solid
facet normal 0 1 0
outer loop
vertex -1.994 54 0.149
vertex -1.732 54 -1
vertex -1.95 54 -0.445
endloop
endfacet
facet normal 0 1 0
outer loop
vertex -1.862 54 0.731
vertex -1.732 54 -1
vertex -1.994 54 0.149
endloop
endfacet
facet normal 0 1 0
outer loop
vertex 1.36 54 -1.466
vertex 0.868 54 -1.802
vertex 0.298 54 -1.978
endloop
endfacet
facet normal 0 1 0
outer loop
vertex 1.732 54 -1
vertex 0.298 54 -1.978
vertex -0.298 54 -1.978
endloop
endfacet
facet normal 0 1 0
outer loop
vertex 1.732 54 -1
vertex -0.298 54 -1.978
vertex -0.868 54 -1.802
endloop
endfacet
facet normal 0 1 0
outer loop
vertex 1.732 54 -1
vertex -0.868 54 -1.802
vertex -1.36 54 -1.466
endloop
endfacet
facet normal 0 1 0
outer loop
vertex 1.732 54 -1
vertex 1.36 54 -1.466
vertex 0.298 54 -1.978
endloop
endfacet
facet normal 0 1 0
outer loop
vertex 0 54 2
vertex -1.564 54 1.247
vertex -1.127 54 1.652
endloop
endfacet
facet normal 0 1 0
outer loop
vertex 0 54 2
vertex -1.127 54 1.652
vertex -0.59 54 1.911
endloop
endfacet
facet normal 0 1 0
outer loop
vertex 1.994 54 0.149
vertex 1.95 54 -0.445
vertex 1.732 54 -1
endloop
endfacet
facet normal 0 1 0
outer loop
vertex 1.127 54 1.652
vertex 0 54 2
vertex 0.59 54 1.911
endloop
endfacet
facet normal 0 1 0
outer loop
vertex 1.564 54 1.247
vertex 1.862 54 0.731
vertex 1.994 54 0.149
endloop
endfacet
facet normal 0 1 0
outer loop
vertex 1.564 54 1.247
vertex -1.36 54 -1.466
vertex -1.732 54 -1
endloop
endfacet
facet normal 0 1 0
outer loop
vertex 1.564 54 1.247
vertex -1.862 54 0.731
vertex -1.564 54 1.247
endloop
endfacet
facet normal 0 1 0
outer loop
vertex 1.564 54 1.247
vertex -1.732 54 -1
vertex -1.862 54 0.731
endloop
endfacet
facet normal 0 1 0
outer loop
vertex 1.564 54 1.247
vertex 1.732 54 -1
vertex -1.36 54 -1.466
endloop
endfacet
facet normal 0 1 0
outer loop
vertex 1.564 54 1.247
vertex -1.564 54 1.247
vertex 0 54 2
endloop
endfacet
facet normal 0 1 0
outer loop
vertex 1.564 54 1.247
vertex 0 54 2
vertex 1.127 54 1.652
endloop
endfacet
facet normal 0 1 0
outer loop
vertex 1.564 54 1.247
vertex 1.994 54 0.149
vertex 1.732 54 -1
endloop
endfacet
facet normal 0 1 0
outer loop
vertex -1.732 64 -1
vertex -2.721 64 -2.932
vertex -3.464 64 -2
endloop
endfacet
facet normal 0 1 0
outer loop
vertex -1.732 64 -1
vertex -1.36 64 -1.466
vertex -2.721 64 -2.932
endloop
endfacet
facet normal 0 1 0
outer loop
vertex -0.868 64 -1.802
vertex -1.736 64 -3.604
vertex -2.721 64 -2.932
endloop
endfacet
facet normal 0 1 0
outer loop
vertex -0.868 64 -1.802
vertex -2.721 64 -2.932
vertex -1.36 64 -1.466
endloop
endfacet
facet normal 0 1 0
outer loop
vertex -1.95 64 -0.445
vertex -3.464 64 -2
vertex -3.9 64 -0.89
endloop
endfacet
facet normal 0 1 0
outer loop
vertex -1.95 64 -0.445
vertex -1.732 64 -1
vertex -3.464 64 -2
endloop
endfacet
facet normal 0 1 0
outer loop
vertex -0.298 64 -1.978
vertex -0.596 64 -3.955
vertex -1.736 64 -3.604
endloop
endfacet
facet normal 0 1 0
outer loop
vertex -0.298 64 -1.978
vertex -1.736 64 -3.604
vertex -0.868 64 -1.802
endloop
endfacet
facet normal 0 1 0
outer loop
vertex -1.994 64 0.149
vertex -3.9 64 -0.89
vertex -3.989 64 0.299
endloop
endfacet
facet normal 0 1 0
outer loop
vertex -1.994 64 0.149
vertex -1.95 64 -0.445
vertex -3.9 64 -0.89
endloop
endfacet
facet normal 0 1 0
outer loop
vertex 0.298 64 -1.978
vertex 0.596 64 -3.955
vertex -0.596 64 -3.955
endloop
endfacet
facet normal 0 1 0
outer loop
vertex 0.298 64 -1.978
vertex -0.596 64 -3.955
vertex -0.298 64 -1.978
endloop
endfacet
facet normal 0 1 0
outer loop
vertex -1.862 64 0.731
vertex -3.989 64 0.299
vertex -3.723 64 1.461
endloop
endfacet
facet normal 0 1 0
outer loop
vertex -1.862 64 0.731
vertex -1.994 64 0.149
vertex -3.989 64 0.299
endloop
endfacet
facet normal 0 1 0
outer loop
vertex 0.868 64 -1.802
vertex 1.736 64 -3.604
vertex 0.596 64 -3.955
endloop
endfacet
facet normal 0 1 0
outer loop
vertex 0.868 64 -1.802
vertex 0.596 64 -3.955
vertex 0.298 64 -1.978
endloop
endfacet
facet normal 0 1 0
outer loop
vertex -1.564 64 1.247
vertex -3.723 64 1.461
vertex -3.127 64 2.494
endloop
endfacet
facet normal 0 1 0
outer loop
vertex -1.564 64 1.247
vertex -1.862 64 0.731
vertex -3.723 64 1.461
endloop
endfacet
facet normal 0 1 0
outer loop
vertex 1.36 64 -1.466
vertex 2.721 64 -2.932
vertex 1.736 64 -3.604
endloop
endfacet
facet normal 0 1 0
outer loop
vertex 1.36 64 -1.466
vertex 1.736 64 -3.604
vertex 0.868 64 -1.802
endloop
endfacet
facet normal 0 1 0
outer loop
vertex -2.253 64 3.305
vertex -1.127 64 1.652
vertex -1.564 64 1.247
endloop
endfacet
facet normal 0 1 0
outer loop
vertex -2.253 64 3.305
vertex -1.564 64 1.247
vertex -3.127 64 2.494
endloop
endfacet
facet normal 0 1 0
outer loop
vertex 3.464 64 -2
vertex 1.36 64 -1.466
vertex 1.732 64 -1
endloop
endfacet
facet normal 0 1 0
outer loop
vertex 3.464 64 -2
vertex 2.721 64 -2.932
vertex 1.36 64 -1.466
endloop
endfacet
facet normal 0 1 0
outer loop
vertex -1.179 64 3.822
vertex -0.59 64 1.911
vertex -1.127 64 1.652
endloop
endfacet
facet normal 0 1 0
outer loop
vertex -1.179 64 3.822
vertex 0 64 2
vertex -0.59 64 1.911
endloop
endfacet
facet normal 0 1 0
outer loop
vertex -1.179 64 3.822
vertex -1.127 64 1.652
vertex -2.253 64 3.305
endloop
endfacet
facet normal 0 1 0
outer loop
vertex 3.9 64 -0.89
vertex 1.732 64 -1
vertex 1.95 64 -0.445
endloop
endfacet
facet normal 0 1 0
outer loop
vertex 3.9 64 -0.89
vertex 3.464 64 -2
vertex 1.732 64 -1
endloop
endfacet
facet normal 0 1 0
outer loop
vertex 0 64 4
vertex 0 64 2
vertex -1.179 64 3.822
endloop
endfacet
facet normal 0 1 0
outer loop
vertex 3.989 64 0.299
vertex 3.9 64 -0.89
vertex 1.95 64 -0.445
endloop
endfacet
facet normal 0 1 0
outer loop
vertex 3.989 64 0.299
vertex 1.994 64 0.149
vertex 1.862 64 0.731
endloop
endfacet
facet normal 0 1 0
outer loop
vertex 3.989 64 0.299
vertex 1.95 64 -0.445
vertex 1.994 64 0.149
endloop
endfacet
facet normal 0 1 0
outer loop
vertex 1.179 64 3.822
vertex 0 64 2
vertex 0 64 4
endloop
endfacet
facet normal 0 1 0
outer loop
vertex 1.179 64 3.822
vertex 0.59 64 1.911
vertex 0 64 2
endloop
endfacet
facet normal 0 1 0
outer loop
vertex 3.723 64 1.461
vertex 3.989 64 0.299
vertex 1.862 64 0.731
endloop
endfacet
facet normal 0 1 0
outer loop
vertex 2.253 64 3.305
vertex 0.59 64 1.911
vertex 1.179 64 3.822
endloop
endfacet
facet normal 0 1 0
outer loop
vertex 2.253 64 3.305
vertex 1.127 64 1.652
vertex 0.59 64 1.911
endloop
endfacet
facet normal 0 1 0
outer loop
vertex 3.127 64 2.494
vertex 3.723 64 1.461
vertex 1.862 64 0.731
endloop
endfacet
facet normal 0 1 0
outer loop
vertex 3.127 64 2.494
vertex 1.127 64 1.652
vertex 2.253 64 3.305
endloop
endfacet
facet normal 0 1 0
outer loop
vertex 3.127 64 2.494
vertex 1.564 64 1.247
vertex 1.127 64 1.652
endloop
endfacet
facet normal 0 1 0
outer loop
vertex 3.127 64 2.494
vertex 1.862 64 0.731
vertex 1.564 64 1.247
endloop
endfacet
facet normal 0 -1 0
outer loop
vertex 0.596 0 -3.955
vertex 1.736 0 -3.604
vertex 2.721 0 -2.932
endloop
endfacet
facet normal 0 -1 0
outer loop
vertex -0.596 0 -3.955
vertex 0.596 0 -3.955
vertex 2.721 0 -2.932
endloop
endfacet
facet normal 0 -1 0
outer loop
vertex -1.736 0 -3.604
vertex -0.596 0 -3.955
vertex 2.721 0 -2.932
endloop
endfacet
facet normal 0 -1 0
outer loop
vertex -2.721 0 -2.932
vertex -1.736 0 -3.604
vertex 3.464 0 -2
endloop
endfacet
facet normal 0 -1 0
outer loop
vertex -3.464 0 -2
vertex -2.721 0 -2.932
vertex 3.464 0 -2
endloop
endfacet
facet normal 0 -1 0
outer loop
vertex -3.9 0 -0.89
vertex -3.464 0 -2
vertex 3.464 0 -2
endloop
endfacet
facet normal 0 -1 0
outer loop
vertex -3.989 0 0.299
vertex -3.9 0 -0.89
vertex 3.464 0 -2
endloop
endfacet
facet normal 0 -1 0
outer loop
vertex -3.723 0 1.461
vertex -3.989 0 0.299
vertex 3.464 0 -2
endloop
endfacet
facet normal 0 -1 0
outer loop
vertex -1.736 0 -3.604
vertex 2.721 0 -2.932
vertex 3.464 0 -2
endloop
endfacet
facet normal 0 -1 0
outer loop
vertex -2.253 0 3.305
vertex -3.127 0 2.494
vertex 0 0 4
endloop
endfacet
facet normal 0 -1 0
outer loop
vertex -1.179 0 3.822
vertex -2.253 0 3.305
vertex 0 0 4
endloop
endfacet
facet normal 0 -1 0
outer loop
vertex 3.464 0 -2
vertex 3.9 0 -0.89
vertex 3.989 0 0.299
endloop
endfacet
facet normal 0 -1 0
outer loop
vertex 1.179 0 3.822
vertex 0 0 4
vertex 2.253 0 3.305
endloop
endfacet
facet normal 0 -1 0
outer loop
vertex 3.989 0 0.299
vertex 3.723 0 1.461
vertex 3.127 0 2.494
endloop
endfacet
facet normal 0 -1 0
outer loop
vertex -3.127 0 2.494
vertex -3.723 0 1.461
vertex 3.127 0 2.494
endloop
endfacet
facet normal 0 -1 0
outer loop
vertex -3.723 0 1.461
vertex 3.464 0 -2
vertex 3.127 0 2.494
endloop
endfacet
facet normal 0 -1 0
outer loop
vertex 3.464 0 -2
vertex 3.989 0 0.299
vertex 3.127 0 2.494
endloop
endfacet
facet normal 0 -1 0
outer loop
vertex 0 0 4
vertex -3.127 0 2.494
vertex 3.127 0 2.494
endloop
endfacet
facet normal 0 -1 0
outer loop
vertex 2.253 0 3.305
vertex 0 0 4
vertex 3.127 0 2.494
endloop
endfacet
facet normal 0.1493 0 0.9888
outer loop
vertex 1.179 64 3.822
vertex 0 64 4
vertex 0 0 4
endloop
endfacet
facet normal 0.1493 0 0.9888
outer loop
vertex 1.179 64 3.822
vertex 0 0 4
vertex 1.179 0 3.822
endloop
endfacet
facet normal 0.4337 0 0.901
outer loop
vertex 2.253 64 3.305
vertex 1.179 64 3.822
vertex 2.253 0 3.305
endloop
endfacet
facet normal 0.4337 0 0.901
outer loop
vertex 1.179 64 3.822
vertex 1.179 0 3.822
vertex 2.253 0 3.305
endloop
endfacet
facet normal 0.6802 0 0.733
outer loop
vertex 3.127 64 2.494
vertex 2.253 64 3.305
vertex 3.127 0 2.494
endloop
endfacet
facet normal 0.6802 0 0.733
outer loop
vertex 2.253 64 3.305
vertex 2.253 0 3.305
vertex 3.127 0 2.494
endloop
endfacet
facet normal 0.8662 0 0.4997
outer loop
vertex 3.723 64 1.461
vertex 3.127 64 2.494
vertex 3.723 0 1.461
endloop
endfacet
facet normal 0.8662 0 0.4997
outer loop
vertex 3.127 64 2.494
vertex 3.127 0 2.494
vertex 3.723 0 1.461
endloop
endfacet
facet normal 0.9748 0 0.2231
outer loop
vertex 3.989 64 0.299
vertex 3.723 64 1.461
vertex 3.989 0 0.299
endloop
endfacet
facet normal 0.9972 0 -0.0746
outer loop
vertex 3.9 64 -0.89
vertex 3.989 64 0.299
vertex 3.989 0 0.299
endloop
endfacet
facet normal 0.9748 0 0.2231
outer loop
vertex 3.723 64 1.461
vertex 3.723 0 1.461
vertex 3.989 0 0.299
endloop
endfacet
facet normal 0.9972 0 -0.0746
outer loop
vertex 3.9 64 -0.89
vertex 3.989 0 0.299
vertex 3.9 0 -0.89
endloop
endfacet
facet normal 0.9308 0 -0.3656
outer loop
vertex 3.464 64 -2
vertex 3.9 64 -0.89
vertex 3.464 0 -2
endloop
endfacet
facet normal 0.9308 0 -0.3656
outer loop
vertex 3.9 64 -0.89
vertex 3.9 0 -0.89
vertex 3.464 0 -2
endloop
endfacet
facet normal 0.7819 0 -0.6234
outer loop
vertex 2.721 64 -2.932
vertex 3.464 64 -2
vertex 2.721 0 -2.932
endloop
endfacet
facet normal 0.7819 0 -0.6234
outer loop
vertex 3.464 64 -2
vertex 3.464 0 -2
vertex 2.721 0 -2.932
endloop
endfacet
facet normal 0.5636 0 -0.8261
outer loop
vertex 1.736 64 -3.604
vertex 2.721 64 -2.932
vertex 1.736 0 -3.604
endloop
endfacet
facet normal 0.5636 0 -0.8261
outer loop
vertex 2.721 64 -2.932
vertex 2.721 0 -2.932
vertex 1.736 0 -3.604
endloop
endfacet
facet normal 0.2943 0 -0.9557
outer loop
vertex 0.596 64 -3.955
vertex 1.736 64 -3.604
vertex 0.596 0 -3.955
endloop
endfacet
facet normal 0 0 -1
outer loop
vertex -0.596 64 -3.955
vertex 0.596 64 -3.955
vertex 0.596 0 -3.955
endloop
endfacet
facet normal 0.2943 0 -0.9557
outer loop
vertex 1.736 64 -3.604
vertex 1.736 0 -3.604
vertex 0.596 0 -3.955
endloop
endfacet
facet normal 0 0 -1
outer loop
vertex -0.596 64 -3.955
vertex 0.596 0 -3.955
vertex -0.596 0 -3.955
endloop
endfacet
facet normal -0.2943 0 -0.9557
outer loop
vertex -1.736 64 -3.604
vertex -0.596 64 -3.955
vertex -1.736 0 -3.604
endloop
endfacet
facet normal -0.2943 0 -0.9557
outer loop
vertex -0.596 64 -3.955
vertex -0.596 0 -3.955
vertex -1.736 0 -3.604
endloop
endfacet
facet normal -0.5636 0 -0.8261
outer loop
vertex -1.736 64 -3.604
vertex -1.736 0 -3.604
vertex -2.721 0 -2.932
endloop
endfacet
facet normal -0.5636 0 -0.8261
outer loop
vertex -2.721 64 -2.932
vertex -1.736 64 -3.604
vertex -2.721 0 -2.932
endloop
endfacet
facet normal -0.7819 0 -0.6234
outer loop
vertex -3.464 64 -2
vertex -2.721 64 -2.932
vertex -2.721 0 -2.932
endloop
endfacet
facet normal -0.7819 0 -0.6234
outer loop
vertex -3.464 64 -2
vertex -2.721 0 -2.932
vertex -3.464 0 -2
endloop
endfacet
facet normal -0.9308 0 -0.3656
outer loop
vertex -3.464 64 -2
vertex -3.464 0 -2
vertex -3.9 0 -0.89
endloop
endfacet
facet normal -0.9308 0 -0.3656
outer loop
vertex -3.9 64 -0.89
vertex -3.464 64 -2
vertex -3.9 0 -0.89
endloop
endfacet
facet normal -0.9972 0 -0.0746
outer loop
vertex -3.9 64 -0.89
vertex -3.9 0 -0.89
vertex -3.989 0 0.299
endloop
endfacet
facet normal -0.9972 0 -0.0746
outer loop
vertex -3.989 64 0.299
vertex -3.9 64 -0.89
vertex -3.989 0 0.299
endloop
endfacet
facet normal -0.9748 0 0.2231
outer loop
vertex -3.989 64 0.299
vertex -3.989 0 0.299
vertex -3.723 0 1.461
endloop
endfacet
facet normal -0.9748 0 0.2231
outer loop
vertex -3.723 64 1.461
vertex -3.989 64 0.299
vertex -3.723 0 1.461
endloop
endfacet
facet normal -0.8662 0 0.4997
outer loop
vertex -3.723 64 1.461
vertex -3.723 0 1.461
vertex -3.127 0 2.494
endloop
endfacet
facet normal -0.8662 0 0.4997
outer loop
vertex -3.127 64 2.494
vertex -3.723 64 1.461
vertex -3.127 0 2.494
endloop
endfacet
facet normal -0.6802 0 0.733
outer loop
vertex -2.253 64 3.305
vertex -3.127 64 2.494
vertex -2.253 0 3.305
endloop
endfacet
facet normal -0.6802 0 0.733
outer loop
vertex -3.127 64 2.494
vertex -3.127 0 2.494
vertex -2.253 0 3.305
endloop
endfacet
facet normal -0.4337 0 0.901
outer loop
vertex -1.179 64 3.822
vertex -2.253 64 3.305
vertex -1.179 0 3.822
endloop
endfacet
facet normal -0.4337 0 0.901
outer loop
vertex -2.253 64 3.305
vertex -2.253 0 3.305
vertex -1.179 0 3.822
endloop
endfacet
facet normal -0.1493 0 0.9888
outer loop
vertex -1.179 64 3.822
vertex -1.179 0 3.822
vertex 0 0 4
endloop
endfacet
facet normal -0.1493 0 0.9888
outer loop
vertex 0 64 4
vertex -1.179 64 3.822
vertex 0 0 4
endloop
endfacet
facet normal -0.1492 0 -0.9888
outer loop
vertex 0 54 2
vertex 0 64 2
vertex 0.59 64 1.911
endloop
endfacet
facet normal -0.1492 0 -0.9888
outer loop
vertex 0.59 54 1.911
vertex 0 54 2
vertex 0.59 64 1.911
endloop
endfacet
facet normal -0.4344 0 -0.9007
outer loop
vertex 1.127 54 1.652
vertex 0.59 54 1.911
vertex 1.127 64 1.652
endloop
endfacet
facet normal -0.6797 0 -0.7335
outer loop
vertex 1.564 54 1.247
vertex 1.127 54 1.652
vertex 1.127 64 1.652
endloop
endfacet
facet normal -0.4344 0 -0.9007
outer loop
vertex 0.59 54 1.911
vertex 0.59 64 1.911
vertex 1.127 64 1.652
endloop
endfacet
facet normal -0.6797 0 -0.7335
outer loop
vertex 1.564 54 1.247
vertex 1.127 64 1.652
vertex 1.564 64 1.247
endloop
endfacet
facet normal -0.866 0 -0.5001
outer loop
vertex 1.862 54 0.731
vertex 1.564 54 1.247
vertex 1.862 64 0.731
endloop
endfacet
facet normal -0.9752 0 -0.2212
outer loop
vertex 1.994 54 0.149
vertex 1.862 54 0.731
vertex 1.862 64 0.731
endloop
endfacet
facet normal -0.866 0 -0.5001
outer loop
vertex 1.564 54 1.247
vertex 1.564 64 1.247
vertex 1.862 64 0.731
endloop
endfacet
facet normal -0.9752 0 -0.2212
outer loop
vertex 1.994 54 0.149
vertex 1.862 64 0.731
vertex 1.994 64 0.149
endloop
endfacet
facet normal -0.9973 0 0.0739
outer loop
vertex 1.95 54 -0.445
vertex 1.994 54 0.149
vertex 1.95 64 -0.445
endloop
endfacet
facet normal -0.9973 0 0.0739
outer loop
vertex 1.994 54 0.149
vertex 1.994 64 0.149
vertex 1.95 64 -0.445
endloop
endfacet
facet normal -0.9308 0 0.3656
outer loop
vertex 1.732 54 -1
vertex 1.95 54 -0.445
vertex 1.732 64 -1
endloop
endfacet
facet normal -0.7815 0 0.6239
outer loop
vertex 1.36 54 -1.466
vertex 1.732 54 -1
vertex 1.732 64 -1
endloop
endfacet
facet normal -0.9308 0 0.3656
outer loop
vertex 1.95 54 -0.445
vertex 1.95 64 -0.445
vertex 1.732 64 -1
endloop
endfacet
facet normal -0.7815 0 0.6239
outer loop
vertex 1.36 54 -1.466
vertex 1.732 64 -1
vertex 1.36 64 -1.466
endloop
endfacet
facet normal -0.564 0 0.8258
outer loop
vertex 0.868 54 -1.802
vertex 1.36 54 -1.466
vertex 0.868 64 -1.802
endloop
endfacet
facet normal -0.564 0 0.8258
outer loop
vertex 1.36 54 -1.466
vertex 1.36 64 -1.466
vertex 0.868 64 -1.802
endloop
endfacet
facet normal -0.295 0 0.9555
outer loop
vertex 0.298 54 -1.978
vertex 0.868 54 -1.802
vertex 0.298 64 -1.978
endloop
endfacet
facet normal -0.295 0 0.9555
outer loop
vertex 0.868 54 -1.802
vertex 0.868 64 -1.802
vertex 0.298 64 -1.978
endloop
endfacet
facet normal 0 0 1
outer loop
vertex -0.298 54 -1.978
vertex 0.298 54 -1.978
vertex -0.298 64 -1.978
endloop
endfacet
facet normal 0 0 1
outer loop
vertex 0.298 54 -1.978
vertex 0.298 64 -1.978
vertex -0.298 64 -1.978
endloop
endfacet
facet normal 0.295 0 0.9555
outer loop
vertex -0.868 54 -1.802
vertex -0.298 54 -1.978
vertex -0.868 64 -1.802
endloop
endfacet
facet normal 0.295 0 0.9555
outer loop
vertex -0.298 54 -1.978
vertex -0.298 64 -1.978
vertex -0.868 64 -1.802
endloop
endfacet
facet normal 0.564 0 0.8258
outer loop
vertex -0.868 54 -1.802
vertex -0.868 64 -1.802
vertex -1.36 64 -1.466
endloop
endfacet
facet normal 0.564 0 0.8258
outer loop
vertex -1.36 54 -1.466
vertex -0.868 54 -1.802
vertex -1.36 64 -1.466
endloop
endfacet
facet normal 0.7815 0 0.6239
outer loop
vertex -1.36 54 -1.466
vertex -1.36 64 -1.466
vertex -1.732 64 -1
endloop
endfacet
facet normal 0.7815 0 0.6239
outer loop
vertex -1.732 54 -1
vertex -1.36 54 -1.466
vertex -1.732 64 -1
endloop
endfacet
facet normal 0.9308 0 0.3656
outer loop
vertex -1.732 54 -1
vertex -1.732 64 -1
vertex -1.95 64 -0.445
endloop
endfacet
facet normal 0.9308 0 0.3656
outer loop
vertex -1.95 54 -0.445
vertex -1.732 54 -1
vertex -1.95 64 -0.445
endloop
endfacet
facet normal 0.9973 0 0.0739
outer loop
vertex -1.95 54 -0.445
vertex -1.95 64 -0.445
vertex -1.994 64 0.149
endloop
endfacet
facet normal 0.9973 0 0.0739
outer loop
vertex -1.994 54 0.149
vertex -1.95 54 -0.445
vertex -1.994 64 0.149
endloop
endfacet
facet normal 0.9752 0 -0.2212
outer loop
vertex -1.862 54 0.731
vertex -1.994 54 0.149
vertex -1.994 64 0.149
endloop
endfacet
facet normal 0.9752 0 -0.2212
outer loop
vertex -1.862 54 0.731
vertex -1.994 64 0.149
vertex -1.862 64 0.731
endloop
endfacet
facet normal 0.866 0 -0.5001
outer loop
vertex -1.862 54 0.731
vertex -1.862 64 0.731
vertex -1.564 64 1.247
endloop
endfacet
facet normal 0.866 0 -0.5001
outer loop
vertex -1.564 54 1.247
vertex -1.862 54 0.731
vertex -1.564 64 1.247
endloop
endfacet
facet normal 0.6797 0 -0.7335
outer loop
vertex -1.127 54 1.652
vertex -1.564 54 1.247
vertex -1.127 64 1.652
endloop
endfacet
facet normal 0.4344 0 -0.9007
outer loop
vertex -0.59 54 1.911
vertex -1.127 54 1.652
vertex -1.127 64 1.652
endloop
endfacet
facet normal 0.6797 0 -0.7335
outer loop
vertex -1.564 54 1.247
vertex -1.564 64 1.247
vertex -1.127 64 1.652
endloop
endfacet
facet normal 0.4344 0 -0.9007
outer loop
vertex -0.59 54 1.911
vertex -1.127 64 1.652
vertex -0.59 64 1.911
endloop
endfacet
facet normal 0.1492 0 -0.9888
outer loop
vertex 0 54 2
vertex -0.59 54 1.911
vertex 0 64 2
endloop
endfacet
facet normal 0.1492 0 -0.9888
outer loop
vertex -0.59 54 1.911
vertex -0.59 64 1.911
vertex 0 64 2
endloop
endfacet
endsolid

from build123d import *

# Parameters (mm, degrees)
SKETCH2_R           = 2
BOSS_EXTRUDE1_DEPTH = 32
SKETCH11_R          = 1
CUT_EXTRUDE3_DEPTH  = 5
SCALE1_SCALE        = 2


with BuildPart() as part:
    # Sketch2 → Boss-Extrude1 (new body)
    with BuildSketch(Plane(origin=(0, 0, 0), x_dir=(1, 0, 0), z_dir=(0, 1, 0))):
        with Locations(Location((0, 0, 0), (0, 0, 270))):
            Circle(SKETCH2_R)
    extrude(amount=BOSS_EXTRUDE1_DEPTH)

    # Sketch11 → Cut-Extrude3 (cut)
    with BuildSketch(Plane(origin=(0, 32, 0), x_dir=(1, 0, 0), z_dir=(0, 1, 0))):
        with Locations(Location((0, 0, 0), (0, 0, 270))):
            Circle(SKETCH11_R)
    extrude(amount=-CUT_EXTRUDE3_DEPTH, mode=Mode.SUBTRACT)


with BuildPart() as part_1:
    # Scale1: scaled about (0, 0, 0)
    add(part.part.scale(SCALE1_SCALE))


solid = part_1.part
